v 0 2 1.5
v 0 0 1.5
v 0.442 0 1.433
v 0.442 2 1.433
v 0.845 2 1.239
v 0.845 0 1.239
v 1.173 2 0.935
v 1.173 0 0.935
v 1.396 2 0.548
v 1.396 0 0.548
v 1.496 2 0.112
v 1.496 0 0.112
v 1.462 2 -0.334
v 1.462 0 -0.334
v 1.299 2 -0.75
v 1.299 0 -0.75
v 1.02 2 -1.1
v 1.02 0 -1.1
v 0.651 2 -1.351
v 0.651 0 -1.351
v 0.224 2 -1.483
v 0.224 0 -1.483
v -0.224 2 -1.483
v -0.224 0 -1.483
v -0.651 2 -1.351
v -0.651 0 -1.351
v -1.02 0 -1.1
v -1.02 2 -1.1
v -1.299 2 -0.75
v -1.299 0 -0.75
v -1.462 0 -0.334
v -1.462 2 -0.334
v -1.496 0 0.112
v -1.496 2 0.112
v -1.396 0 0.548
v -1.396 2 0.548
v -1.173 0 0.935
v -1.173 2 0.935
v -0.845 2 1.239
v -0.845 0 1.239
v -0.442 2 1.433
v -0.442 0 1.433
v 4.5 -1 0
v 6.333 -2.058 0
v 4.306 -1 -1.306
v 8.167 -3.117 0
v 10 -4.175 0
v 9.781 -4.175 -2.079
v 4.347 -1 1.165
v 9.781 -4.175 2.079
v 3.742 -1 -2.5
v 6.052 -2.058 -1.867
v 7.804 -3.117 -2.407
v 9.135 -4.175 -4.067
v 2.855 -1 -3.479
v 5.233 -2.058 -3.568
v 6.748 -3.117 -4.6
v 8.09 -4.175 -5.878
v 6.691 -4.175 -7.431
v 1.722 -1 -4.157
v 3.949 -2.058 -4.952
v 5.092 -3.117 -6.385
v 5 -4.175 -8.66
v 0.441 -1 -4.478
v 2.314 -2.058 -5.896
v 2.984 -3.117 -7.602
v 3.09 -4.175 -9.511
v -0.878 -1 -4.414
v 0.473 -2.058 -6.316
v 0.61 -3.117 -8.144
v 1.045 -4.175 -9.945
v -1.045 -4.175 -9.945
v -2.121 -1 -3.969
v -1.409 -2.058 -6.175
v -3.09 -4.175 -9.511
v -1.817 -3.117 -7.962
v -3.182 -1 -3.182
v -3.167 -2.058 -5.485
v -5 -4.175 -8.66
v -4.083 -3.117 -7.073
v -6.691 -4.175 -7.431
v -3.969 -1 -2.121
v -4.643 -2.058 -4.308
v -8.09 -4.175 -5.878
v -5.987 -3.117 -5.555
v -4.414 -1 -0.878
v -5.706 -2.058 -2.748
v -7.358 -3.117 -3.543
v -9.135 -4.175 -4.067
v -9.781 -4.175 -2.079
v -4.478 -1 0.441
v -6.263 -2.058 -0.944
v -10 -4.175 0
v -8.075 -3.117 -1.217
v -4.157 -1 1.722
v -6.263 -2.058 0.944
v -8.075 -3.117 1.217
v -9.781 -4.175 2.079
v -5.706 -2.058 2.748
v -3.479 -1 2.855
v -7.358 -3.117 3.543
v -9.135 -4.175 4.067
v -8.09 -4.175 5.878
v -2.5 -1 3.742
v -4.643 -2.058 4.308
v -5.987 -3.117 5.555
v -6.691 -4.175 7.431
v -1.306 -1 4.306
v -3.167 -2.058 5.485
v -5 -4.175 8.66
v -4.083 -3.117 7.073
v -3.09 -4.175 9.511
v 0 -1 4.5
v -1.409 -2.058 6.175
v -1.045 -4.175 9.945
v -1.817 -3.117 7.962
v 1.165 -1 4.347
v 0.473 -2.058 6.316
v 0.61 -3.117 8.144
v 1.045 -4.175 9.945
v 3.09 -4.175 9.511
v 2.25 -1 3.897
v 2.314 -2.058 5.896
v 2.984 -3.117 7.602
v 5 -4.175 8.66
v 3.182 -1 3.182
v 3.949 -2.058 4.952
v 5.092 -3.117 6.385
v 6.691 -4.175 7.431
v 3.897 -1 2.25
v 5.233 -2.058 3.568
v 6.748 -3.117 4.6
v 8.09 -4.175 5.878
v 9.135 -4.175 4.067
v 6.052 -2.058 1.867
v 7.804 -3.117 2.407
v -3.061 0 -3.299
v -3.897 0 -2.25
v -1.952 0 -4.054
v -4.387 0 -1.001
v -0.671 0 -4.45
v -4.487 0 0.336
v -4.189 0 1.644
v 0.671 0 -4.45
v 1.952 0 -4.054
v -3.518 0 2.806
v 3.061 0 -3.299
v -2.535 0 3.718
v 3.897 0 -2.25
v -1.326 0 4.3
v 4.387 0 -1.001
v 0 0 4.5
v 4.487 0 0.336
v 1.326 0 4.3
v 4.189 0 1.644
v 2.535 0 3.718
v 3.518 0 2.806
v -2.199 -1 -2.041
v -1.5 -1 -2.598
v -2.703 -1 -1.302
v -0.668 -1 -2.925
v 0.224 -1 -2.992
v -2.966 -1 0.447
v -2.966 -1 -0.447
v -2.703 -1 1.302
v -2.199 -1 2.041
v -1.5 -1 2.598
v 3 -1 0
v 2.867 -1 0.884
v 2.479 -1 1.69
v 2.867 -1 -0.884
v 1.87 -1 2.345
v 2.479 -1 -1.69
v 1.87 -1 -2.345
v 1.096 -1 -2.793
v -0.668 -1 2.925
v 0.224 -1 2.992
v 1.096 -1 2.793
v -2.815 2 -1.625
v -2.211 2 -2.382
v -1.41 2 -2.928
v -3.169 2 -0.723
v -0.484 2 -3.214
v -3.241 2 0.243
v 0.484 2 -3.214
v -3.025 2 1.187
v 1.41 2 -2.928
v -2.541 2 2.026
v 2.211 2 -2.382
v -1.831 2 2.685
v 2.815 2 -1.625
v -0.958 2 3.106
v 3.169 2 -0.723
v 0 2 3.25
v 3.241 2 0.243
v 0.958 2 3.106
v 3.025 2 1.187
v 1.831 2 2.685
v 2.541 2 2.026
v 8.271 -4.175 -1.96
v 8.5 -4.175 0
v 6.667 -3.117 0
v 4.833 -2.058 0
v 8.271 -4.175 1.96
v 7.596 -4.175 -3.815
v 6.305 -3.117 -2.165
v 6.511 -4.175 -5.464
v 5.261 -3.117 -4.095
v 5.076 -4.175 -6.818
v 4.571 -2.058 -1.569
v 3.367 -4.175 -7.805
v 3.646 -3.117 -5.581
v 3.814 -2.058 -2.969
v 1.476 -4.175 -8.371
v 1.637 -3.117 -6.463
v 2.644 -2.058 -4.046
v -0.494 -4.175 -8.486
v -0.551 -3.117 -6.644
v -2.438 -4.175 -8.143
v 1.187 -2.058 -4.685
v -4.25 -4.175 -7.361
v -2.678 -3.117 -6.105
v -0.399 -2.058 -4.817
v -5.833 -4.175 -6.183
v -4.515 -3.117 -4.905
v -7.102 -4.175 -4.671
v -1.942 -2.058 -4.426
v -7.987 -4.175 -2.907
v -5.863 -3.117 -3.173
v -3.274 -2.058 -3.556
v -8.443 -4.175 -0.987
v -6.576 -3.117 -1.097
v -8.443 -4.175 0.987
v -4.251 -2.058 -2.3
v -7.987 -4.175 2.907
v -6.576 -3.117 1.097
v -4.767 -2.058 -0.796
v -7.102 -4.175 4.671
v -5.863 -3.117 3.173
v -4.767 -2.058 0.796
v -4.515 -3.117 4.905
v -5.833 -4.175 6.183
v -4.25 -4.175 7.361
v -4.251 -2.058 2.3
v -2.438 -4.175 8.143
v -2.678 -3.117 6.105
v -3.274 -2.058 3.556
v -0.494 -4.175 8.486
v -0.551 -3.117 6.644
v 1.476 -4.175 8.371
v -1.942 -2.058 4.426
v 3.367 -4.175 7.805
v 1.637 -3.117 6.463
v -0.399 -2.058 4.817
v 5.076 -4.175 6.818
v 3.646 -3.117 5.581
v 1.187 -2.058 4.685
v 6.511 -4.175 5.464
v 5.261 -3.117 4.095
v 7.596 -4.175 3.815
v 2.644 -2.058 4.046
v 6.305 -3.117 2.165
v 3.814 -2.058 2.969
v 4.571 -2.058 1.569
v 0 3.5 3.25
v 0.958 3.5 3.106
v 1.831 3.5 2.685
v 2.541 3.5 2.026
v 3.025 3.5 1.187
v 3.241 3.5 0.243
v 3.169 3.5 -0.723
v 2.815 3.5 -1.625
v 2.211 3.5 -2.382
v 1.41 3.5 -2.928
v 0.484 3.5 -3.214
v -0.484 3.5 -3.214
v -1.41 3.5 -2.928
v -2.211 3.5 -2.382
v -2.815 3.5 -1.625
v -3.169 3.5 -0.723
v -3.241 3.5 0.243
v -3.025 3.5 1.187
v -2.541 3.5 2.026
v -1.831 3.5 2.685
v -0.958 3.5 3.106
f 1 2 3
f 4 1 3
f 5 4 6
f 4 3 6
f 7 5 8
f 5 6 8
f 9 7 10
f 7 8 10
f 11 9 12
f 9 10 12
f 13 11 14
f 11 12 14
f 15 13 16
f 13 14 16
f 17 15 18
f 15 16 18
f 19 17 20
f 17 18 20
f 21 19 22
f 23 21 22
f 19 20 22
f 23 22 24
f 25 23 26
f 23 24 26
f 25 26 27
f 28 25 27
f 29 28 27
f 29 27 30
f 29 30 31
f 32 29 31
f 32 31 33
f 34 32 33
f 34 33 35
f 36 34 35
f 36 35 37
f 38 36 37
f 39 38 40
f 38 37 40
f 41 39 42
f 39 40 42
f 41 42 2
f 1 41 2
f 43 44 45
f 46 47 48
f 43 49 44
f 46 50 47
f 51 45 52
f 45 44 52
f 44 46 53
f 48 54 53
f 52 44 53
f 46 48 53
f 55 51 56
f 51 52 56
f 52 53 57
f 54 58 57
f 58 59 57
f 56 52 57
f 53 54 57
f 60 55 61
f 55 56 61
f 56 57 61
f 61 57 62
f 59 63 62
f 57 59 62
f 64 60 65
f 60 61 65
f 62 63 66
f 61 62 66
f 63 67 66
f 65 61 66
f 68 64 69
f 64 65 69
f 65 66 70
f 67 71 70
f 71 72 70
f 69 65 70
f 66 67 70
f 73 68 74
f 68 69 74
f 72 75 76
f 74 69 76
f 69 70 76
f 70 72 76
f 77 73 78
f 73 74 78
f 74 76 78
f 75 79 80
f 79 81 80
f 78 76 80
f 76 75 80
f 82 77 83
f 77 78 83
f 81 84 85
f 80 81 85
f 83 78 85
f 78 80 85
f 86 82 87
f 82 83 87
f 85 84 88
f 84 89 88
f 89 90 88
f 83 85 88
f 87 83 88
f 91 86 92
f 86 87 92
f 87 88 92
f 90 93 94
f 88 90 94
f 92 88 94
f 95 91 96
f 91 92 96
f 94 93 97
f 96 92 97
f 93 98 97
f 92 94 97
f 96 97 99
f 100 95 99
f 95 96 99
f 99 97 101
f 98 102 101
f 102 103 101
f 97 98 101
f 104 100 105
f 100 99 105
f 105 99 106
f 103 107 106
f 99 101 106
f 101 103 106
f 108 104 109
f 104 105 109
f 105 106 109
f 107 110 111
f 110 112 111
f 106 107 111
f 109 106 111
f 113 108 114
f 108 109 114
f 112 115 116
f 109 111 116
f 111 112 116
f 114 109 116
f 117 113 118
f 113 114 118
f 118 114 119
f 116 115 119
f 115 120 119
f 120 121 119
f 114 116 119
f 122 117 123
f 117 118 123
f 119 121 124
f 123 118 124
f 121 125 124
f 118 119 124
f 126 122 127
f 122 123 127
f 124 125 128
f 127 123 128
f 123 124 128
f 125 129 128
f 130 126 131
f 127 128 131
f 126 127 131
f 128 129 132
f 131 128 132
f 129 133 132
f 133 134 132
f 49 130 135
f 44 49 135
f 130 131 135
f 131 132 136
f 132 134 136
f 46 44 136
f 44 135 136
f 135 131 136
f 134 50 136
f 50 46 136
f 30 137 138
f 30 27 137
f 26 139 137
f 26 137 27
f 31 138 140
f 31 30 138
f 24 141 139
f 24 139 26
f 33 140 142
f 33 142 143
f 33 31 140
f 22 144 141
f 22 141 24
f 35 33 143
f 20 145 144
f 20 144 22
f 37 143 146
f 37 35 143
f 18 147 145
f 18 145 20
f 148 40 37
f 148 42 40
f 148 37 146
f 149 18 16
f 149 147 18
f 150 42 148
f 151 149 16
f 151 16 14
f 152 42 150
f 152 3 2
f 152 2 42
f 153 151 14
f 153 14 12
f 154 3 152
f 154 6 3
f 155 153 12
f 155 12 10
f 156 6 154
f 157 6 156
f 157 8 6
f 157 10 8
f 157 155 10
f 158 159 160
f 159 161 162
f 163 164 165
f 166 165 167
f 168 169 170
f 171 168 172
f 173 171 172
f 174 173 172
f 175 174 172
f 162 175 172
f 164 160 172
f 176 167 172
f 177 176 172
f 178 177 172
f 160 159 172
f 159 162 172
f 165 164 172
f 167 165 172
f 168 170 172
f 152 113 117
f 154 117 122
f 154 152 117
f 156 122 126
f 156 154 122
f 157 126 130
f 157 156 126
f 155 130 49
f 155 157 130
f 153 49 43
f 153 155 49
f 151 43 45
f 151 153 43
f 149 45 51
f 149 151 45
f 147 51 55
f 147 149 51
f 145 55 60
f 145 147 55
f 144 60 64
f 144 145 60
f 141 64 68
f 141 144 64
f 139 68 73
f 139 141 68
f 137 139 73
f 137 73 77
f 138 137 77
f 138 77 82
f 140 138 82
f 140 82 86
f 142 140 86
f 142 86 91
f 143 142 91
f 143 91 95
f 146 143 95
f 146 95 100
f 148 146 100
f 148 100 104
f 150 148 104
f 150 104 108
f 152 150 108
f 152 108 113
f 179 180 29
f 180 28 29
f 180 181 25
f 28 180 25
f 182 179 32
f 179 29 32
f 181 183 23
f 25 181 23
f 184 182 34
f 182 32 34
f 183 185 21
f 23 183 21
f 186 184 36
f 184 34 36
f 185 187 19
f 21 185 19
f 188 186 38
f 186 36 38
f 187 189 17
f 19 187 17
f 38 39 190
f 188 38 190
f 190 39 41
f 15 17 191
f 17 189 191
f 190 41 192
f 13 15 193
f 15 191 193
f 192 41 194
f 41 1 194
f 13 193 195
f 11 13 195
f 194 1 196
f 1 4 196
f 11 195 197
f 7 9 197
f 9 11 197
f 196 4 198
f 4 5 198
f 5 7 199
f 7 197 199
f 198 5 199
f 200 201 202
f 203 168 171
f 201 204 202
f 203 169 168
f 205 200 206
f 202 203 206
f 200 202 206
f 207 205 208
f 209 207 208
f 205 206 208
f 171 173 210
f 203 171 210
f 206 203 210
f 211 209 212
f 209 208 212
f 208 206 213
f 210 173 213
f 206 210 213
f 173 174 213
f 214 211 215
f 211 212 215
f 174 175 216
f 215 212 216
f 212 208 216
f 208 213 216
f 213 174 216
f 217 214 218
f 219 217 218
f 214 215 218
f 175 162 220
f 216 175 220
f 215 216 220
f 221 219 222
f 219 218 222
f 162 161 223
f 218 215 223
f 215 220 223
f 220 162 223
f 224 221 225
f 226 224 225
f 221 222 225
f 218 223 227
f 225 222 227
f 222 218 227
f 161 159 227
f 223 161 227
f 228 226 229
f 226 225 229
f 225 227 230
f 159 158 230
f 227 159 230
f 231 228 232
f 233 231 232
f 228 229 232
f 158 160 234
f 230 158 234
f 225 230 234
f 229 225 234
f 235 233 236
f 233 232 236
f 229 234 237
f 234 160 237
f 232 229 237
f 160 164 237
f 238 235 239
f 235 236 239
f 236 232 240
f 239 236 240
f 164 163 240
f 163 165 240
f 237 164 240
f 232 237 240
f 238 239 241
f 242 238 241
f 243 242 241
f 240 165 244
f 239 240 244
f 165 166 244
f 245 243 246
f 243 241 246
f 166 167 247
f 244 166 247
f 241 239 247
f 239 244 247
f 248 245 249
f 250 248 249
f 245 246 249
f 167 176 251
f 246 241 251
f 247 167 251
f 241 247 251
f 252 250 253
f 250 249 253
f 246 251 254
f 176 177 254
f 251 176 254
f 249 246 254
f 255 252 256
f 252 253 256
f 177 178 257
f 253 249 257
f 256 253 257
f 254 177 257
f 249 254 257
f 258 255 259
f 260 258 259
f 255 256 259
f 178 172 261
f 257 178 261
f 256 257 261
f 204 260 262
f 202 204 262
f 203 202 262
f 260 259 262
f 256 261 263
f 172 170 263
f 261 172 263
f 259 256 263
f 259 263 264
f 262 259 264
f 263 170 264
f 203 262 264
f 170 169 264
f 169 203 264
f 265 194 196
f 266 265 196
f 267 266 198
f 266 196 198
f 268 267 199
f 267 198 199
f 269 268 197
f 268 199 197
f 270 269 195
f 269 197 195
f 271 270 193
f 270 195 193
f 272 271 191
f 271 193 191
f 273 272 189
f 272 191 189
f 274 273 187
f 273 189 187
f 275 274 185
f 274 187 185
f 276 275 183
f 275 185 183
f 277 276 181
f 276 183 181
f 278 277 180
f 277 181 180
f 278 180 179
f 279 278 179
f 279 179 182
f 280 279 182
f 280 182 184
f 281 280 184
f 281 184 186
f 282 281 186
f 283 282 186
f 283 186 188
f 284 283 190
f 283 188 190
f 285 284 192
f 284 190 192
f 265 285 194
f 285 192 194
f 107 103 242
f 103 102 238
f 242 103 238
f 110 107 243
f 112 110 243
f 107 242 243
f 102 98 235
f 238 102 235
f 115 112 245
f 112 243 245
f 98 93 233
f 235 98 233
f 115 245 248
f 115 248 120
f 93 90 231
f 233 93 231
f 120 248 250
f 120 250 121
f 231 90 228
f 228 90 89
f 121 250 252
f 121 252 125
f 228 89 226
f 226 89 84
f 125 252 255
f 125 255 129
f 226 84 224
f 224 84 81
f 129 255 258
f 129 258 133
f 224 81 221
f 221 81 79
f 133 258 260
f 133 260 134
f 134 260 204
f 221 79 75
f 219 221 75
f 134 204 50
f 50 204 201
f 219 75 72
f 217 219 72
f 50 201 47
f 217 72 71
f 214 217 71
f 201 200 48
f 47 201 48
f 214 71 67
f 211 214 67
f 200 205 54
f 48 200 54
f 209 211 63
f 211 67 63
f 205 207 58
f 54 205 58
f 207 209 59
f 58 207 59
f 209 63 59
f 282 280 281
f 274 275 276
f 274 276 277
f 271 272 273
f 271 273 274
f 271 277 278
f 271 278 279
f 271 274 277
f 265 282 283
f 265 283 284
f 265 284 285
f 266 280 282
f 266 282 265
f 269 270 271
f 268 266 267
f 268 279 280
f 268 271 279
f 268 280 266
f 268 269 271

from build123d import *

# Parameters (mm, degrees)
SKETCH_1_R      = 1.5
EXTRUDE_1_DEPTH = 2
EXTRUDE_START   = 2
SKETCH_2_R      = 3.25
EXTRUDE_2_DEPTH = 1.5
SKETCH_3_R      = 4.5
EXTRUDE_3_DEPTH = 1


with BuildPart() as part:
    # 草图1 → 凸台-拉伸1 (new body)
    with BuildSketch(Plane(origin=(0, 0, 0), x_dir=(1, 0, 0), z_dir=(0, 1, 0))):
        with Locations(Location((0, 0, 0), (0, 0, 270))):
            Circle(SKETCH_1_R)
    extrude(amount=EXTRUDE_1_DEPTH)

    # 草图2 → 凸台-拉伸2 (add)
    with BuildSketch(Plane(origin=(0, 0, 0), x_dir=(1, 0, 0), z_dir=(0, 1, 0)).offset(EXTRUDE_START)):
        with Locations(Location((0, 0, 0), (0, 0, 270))):
            Circle(SKETCH_2_R)
    extrude(amount=EXTRUDE_2_DEPTH)

    # 草图3 → 凸台-拉伸3 (add)
    with BuildSketch(Plane(origin=(0, 0, 0), x_dir=(1, 0, 0), z_dir=(0, 1, 0))):
        with Locations(Location((0, 0, 0), (0, 0, 270))):
            Circle(SKETCH_3_R)
    extrude(amount=-EXTRUDE_3_DEPTH)

    # 草图4 → 旋转1 (revolve)
    with BuildSketch(Plane.XY):
        Polygon((4.5, -1), (10, -4.175426481), (8.5, -4.175426481), (3, -1), align=None)
    revolve(axis=Axis((0, -1000, 0), (0, 1, 0)))


solid = part.part
